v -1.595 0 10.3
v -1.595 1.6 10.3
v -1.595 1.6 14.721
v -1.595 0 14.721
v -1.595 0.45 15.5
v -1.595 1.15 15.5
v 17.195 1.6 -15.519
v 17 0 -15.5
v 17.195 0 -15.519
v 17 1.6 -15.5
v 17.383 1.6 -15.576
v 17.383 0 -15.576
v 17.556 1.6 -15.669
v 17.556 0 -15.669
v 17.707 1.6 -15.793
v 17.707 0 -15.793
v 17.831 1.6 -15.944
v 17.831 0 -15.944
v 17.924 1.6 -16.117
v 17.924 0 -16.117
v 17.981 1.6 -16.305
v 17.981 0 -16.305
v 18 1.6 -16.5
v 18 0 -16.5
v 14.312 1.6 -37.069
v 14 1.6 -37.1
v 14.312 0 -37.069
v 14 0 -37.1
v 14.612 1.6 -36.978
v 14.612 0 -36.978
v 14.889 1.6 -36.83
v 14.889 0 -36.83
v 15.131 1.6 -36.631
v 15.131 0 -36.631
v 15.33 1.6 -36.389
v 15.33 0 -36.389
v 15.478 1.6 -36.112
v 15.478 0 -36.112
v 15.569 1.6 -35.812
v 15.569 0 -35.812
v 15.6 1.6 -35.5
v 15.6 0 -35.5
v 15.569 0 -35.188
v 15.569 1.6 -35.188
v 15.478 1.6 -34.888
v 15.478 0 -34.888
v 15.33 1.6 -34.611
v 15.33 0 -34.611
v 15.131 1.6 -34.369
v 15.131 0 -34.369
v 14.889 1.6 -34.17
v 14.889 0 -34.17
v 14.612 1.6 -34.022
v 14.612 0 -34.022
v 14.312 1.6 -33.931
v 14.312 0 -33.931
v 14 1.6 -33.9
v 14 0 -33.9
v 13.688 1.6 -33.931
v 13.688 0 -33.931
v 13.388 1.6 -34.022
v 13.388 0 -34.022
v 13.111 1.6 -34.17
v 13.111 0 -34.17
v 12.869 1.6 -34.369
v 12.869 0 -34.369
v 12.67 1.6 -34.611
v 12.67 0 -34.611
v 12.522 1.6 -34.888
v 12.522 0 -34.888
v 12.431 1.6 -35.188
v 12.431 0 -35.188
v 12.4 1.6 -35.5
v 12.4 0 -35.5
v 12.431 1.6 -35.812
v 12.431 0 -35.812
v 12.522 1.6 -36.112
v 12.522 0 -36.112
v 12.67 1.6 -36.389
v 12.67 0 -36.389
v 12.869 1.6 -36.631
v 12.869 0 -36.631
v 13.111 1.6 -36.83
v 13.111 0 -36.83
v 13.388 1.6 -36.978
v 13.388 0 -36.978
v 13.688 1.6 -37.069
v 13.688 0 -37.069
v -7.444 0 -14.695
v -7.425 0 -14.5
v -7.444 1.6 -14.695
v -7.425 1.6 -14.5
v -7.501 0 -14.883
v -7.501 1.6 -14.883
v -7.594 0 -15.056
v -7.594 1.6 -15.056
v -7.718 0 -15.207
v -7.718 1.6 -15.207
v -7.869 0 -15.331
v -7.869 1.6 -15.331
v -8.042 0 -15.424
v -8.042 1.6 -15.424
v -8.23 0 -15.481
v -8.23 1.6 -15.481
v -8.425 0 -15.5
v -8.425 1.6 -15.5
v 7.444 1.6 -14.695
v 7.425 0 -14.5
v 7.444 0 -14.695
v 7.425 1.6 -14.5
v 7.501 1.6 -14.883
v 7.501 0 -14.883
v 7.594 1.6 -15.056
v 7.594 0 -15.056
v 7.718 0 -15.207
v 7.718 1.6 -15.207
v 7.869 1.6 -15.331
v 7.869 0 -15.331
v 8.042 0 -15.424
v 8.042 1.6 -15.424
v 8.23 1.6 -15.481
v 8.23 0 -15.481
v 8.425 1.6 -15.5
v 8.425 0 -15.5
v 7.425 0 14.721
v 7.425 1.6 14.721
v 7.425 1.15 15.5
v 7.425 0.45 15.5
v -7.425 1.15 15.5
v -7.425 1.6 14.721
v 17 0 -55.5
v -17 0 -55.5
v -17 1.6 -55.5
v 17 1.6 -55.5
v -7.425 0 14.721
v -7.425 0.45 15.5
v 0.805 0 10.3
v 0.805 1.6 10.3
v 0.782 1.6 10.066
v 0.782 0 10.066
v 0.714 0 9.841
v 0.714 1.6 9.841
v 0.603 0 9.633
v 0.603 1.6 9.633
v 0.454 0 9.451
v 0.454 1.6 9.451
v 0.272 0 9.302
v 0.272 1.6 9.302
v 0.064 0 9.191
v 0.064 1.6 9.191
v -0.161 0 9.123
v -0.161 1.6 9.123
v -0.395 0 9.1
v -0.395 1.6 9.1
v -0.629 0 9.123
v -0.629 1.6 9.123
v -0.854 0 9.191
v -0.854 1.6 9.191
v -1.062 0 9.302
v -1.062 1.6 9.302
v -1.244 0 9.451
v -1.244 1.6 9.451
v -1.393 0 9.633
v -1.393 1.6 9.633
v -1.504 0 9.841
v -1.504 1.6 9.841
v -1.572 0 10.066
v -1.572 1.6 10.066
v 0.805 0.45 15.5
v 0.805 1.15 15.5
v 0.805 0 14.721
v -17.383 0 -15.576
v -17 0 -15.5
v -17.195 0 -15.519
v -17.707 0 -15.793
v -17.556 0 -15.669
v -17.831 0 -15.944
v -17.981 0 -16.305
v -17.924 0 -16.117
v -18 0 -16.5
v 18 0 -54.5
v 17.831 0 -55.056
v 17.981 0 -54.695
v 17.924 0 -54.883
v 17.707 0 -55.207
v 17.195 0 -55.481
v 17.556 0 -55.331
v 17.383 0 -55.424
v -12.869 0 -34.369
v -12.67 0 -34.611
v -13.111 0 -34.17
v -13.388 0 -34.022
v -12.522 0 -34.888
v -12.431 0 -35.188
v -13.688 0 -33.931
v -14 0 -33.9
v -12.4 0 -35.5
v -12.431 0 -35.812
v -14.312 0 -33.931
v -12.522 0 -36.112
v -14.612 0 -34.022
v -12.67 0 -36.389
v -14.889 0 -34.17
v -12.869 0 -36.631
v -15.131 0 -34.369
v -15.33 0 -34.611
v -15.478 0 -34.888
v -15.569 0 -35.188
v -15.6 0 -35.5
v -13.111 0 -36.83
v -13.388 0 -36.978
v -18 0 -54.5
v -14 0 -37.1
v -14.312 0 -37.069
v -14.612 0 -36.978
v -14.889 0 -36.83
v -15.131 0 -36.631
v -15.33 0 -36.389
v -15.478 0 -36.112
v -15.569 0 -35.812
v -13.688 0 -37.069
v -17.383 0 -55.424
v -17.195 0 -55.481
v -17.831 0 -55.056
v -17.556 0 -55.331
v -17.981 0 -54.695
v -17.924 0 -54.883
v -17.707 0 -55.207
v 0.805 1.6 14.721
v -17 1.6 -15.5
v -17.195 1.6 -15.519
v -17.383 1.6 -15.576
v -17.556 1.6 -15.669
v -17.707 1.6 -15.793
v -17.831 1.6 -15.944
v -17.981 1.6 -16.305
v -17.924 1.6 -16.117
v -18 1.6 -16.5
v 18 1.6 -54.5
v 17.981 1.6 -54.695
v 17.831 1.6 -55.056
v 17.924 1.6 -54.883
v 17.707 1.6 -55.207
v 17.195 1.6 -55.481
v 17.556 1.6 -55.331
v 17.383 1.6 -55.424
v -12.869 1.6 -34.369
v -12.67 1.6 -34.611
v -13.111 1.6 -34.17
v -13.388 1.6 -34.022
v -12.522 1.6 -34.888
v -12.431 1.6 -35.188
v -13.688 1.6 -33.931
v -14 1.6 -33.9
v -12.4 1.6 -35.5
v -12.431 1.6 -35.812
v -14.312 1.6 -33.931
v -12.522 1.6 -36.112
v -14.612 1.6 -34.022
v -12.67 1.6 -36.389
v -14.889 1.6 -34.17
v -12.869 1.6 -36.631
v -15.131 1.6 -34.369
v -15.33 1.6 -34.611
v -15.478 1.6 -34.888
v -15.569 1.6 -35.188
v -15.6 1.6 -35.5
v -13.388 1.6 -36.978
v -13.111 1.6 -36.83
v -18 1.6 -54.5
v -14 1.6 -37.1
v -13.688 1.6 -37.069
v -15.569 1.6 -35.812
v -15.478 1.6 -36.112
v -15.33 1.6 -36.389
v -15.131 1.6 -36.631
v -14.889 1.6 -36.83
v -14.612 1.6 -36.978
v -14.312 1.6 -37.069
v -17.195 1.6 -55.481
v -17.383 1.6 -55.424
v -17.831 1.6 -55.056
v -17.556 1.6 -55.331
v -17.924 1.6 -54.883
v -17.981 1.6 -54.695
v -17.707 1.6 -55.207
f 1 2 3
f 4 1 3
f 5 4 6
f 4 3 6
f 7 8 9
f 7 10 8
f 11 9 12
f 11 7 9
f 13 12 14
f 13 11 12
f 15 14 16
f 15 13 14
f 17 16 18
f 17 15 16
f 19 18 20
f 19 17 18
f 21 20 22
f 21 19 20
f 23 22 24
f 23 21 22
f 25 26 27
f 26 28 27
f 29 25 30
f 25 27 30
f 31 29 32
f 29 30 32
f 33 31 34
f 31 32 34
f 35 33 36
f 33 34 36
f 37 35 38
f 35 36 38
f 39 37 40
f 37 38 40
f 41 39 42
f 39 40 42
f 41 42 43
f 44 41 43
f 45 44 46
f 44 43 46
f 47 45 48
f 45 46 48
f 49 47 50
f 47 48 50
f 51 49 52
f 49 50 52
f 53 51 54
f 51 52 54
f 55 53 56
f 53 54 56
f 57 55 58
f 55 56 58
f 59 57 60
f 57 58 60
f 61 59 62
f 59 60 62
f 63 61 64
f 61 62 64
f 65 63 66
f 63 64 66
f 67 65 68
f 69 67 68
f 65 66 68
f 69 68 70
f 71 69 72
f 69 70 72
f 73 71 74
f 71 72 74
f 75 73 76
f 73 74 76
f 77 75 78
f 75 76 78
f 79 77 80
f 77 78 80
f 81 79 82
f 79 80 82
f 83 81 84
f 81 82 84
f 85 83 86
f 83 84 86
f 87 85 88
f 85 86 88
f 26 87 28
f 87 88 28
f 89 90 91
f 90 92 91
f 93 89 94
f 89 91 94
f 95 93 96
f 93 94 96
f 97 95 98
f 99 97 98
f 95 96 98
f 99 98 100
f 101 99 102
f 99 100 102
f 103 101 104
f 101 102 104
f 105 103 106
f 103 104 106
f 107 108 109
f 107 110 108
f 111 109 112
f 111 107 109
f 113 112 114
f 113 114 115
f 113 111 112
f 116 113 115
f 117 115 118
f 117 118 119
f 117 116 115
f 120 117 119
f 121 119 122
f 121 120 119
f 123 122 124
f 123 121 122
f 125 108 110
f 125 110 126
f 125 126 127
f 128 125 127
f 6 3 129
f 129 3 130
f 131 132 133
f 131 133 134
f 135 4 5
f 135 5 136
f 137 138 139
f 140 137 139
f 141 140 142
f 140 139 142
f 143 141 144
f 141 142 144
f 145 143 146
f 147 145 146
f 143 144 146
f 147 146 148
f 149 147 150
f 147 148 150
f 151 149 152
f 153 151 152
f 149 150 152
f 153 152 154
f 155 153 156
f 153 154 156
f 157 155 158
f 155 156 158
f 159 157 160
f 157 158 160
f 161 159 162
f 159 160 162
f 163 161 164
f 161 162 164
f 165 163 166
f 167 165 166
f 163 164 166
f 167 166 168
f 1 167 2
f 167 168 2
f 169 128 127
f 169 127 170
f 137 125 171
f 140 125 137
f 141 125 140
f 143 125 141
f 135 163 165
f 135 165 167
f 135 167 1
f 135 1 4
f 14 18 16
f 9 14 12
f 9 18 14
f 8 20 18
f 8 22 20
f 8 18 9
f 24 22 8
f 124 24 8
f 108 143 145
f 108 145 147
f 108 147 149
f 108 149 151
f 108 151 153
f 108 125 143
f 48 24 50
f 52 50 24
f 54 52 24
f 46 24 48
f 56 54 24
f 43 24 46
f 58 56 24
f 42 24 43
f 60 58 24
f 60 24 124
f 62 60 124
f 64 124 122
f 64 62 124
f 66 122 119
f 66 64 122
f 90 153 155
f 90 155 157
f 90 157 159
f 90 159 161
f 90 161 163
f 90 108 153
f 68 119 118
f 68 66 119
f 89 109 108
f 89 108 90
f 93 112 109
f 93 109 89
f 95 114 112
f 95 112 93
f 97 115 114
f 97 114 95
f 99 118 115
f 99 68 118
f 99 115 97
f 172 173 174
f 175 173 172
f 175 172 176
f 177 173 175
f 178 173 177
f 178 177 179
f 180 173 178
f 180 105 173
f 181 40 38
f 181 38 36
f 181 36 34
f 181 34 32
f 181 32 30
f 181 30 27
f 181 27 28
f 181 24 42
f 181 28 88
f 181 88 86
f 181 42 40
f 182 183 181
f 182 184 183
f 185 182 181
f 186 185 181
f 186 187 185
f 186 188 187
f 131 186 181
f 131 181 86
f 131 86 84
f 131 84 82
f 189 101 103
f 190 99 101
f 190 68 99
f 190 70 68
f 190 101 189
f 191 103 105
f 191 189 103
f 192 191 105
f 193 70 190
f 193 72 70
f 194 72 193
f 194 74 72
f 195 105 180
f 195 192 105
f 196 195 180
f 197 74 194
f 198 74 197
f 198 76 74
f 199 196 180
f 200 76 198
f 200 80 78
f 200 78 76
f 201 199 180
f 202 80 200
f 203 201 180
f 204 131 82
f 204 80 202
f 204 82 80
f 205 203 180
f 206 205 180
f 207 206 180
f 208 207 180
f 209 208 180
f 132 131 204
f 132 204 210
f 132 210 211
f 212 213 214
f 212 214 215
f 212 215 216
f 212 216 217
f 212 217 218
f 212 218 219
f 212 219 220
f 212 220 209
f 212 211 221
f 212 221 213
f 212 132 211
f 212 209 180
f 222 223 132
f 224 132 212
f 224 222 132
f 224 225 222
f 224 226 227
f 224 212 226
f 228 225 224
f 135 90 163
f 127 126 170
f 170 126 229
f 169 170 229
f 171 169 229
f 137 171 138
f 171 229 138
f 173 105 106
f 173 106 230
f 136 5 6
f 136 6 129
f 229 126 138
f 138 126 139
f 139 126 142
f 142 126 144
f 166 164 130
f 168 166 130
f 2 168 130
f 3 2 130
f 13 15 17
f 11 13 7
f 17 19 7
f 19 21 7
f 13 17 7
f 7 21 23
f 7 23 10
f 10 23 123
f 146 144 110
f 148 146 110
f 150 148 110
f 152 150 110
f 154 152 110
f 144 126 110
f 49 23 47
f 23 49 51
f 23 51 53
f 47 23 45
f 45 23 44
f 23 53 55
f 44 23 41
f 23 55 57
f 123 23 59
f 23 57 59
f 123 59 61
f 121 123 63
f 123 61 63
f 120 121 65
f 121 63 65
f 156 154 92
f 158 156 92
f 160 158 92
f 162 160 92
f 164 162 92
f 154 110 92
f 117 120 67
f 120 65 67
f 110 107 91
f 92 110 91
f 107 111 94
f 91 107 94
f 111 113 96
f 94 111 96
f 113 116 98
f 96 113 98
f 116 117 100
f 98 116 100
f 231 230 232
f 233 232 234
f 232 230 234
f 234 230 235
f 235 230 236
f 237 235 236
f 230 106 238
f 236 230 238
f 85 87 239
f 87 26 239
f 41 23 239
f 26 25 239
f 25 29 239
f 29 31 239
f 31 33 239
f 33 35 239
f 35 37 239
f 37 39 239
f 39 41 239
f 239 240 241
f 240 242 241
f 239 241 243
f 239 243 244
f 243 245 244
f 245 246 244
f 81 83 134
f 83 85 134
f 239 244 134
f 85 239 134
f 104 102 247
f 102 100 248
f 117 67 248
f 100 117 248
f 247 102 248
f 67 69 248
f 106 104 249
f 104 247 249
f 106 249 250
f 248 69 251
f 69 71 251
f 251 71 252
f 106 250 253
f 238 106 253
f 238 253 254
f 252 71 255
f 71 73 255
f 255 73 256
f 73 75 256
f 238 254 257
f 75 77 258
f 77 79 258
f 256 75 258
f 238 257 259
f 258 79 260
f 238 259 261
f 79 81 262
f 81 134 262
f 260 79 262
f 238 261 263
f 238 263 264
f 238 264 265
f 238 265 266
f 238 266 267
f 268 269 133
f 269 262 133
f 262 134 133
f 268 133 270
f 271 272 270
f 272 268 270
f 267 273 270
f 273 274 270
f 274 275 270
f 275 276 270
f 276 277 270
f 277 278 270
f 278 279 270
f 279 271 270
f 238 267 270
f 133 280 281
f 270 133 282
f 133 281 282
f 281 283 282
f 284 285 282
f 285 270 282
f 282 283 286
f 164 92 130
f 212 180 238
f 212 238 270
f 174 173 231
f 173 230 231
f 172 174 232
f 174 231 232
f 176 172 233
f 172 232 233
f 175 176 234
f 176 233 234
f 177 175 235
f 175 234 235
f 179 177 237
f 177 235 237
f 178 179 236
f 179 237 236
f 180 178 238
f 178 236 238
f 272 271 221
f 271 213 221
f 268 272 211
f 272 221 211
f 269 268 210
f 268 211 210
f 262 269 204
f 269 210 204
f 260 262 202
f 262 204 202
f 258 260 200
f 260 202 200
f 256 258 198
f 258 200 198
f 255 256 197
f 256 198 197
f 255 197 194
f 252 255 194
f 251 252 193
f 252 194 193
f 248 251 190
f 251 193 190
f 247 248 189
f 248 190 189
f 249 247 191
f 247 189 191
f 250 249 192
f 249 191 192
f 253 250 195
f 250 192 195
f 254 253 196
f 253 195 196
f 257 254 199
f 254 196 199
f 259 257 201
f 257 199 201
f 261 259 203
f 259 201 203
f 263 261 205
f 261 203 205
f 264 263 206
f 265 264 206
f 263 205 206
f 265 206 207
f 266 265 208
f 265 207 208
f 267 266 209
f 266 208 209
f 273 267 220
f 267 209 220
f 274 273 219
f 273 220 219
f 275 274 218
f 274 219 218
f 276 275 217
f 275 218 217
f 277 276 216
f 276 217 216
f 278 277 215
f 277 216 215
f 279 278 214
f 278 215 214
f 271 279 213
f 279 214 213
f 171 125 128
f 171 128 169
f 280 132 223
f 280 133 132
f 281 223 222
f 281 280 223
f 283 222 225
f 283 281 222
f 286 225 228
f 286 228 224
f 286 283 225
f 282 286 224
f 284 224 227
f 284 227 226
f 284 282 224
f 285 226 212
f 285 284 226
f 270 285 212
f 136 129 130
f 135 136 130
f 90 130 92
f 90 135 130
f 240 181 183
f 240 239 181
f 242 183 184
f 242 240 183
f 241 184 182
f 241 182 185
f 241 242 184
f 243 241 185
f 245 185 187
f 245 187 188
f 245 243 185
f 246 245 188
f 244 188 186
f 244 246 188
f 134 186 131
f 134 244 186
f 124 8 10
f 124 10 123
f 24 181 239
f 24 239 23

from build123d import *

# Parameters (mm, degrees)
BOSS_EXTRUDE1_DEPTH            = 1.6
CHAMFER1_SIZE                  = 0.45
CHAMFER1_SIZE2                 = 0.779422863
FILLET1_R                      = 1
CUT_EXTRUDE1_DEPTH             = 2.6
F_3_2_3_2_DIAMETER_HOLE1_D     = 3.2
F_3_2_3_2_DIAMETER_HOLE1_DEPTH = 1.6
F_3_2_3_2_DIAMETER_HOLE1_TIP   = 0.96137699


with BuildPart() as part:
    # Sketch1 → Boss-Extrude1 (new body)
    with BuildSketch(Plane(origin=(0, 0, 0), x_dir=(1, 0, 0), z_dir=(0, 1, 0))):
        Polygon((-7.425, 15.5), (-18, 15.5), (-18, 55.5), (18, 55.5), (18, 15.5), (7.425, 15.5), (7.425, -15.5), (-7.425, -15.5), align=None)
    extrude(amount=BOSS_EXTRUDE1_DEPTH)

    # Chamfer1
    chamfer1_edges = [part.edges().sort_by_distance(p)[0] for p in [
        (0, 1.6, 15.5),
        (0, 0, 15.5),
    ]]
    chamfer1_side = [part.faces().sort_by_distance(p)[0] for p in [
        (0, 0.8, 15.5),
    ]]
    chamfer(chamfer1_edges, length=CHAMFER1_SIZE, length2=CHAMFER1_SIZE2, reference=chamfer1_side[0])

    # Fillet1
    fillet1_edges = [part.edges().sort_by_distance(p)[0] for p in [
        (-7.425, 0.8, -15.5),
        (-18, 0.8, -15.5),
        (-18, 0.8, -55.5),
        (18, 0.8, -55.5),
        (18, 0.8, -15.5),
        (7.425, 0.8, -15.5),
    ]]
    fillet(fillet1_edges, radius=FILLET1_R)

    # Sketch2 → Cut-Extrude1 (cut, through all)
    with BuildSketch(Plane(origin=(0, 1.6, 0), x_dir=(1, 0, 0), z_dir=(0, 1, 0))):
        with BuildLine():
            Line((-1.595, -10.3), (-1.595, -15.5))
            Line((-1.595, -15.5), (0.805, -15.5))
            Line((0.805, -15.5), (0.805, -10.3))
            ThreePointArc((0.805, -10.3), (-0.395, -9.1), (-1.595, -10.3))
        make_face()
    extrude(amount=-CUT_EXTRUDE1_DEPTH, mode=Mode.SUBTRACT)

    # Ø3.2 (3.2) Diameter Hole1
    with Locations(Plane(origin=(-14, 1.6, -35.5), x_dir=(0, 0, 1), z_dir=(0, 1, 0))):
        with Locations((0, 0), (0, 28)):
            Hole(F_3_2_3_2_DIAMETER_HOLE1_D / 2, depth=F_3_2_3_2_DIAMETER_HOLE1_DEPTH)
            with Locations((0, 0, -(F_3_2_3_2_DIAMETER_HOLE1_DEPTH + F_3_2_3_2_DIAMETER_HOLE1_TIP / 2))):  # 118° drill point
                Cone(0, F_3_2_3_2_DIAMETER_HOLE1_D / 2, F_3_2_3_2_DIAMETER_HOLE1_TIP, mode=Mode.SUBTRACT)


solid = part.part
